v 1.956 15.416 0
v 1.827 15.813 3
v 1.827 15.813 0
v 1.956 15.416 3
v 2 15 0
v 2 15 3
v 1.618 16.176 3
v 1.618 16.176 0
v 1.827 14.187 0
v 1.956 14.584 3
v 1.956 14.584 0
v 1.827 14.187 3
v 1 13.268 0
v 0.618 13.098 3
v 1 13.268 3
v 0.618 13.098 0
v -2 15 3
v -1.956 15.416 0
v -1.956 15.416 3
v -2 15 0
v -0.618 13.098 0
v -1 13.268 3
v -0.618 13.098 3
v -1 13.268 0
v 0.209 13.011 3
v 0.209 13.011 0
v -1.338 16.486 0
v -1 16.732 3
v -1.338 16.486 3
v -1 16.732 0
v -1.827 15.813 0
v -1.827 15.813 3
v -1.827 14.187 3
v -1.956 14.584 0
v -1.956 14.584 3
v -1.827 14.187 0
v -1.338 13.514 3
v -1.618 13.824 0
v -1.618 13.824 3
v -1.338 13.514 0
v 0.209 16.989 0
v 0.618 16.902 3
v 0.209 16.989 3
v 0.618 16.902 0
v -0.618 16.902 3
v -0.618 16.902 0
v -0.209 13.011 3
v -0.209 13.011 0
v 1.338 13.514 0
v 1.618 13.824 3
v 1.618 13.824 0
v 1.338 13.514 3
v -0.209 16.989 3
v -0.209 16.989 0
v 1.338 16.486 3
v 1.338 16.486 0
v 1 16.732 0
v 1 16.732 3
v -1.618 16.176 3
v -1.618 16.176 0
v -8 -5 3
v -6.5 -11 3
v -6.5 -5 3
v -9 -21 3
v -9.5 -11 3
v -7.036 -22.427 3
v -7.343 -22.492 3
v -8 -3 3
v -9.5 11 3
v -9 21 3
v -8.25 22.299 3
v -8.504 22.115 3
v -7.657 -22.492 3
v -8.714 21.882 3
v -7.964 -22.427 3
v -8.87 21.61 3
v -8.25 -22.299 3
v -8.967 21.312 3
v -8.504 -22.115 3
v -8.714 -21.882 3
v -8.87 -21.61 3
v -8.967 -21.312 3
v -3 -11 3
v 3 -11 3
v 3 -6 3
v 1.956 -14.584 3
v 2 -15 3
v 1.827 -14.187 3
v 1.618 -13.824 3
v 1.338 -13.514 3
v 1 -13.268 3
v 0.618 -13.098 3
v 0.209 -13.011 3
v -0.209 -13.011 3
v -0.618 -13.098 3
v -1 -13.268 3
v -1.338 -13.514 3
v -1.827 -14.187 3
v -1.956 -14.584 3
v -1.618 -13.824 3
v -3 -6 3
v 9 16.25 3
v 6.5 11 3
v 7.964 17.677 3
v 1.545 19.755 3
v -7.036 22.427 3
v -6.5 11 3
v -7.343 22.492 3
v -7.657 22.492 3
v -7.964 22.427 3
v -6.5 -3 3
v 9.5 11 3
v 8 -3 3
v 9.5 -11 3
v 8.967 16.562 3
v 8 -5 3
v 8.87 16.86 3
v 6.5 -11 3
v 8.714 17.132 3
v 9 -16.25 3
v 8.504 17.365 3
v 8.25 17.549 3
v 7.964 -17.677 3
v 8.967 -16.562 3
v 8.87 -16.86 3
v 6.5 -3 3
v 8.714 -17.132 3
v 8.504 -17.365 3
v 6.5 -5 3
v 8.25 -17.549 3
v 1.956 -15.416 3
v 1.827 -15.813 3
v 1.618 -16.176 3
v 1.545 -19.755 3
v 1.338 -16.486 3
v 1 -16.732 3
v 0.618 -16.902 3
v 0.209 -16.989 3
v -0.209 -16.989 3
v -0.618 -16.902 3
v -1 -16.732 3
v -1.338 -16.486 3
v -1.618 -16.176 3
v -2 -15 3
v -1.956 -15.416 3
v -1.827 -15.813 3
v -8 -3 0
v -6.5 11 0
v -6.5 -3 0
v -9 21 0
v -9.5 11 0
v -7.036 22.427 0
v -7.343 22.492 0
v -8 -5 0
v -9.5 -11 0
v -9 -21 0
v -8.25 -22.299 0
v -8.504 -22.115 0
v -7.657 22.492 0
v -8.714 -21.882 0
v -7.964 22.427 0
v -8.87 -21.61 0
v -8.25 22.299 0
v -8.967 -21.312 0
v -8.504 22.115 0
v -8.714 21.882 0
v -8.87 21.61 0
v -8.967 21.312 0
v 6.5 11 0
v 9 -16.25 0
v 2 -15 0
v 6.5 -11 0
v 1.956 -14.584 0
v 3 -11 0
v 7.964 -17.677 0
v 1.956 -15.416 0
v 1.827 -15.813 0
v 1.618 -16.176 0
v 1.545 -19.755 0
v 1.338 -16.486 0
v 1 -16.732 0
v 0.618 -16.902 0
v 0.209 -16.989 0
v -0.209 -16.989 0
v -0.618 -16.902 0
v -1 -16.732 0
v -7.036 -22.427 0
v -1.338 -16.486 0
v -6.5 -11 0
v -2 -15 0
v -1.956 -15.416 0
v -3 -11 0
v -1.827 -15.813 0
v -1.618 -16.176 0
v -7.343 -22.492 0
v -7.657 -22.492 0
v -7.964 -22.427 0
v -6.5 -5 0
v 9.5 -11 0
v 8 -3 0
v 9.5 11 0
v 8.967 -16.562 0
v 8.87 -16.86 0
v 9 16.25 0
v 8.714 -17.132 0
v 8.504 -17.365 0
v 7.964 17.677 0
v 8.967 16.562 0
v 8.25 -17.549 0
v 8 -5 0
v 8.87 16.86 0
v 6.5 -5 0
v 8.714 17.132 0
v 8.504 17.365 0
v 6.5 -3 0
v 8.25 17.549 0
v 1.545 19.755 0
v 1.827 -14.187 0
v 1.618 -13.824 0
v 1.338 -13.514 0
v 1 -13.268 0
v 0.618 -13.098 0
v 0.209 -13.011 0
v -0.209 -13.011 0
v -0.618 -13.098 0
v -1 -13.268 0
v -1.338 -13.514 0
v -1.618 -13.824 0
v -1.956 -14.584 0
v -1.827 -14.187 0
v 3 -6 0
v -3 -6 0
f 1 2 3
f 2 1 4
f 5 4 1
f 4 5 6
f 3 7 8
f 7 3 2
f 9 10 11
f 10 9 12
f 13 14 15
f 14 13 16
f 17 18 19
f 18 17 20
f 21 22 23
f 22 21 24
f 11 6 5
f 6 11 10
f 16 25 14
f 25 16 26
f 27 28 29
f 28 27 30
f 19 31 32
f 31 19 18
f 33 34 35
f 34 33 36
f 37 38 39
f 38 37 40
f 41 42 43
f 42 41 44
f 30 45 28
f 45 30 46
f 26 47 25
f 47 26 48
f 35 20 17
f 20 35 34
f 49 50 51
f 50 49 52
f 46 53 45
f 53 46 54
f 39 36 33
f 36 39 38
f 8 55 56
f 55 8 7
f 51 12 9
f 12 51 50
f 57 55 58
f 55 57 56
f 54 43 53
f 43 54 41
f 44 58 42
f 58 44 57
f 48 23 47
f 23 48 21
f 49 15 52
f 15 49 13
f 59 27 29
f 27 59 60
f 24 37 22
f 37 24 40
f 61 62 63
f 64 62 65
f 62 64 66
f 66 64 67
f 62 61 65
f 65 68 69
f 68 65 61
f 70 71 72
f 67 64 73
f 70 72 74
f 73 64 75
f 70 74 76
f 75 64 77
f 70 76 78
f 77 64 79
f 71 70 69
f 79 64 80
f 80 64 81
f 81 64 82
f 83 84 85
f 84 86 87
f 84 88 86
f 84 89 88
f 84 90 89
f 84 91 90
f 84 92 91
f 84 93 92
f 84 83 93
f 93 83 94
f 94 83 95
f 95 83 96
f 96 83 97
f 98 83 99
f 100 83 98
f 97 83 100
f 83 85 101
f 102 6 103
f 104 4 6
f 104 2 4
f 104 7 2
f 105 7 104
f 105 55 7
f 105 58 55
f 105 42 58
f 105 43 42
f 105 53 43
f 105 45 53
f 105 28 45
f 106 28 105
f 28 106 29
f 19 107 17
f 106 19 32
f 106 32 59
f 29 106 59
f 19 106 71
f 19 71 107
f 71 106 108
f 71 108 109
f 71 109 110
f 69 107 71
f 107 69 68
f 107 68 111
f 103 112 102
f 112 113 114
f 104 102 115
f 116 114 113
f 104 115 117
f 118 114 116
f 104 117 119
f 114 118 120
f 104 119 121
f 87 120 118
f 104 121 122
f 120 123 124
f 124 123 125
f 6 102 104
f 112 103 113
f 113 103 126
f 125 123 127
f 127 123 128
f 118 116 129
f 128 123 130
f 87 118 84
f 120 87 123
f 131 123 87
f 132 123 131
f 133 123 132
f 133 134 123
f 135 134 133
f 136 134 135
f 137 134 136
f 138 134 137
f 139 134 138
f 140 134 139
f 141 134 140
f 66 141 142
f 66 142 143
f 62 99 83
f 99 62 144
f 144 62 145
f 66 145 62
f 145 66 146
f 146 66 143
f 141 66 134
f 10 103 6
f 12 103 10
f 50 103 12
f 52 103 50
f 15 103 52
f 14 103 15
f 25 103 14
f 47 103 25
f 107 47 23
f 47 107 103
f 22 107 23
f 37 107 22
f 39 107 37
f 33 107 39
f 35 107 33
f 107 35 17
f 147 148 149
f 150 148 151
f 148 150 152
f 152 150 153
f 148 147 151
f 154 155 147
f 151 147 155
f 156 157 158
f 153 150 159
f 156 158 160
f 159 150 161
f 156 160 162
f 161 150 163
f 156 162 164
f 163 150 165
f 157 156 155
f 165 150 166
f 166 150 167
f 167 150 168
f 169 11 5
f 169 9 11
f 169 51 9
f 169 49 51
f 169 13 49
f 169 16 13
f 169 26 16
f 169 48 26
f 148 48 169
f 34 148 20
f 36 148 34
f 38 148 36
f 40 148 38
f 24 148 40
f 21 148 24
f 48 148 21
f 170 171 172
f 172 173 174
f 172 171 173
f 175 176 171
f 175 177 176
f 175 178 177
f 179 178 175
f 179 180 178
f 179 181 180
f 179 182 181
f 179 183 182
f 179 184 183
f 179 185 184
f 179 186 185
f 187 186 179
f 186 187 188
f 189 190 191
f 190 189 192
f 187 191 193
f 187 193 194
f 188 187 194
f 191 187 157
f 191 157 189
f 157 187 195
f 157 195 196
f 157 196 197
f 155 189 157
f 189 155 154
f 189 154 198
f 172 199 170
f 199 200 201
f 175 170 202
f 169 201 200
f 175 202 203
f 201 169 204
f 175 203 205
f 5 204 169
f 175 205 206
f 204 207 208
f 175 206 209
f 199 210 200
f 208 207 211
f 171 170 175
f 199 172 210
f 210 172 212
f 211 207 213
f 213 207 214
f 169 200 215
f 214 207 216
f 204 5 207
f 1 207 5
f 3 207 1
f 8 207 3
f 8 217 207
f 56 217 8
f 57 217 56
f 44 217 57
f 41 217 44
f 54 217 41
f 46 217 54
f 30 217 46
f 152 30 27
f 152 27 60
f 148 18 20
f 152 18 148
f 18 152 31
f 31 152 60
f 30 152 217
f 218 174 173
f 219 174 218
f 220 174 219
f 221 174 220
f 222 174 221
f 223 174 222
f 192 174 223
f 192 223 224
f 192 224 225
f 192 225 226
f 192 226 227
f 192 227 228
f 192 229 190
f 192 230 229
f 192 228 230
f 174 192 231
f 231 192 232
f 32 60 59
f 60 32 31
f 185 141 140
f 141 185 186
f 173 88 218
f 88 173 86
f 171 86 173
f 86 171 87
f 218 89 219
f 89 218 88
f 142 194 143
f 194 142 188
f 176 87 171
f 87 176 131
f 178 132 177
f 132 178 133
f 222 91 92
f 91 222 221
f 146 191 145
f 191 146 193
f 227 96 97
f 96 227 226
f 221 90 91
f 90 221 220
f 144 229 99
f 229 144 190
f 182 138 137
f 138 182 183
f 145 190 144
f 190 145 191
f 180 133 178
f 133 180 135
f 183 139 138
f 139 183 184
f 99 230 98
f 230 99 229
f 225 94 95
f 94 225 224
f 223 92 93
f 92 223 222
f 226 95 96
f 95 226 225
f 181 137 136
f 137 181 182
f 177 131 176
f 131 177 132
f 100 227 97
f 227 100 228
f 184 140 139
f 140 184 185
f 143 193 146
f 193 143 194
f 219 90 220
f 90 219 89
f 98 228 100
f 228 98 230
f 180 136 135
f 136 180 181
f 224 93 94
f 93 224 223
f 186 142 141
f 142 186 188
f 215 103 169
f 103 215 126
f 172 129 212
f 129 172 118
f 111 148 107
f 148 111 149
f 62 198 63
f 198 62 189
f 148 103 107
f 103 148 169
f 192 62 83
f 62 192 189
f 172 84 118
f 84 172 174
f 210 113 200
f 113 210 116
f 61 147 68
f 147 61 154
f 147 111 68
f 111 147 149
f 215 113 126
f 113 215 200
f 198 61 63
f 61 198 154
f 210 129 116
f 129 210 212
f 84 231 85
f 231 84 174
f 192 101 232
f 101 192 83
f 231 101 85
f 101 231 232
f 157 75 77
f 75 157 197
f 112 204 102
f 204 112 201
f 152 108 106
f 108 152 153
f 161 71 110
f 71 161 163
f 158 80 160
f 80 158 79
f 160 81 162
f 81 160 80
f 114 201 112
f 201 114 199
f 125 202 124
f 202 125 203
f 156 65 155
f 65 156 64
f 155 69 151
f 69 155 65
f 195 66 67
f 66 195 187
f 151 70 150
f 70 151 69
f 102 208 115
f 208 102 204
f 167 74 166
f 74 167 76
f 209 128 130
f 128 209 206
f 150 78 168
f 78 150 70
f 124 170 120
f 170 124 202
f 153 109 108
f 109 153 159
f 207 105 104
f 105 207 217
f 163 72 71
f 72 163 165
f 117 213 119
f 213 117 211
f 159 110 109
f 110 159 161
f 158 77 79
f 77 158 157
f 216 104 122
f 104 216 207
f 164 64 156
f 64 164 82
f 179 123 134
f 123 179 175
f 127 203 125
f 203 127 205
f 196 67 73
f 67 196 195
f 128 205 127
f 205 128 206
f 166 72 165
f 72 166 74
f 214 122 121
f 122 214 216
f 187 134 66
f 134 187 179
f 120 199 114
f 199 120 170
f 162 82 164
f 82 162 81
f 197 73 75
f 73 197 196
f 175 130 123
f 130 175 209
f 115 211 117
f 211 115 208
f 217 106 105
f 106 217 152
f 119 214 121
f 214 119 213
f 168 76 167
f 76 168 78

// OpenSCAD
BASE_WIDTH = 19;
BASE_LENGTH = 22;
BASE_MOUNT_DIA = 10;
THICKNESS = 3;

MOUNT_HOLE_DIA = 4;
MOUNT_HOLE_SPACING = 30;

MID_HOLE_WIDTH = 13;
MID_HOLE_LENGTH = 22;
MID_HOLE_TAB_WIDTH = 6;
MID_HOLE_TAB_LENGTH = 5;
MID_HOLE_NUB_WIDTH = 1.5;
MID_HOLE_NUB_LENGTH = 2;
MID_HOLE_NUB_OFFSET = MID_HOLE_LENGTH/2-7;

CORNER_DIA = 3;
CORNER_SPACING_BOTTOM = 35.5 - CORNER_DIA;
CORNER_SPACING_TOP = 45 - CORNER_DIA;
CORNER_SPACING_X = 18 - CORNER_DIA;

BOUND_WIDTH = max(CORNER_SPACING_X, BASE_WIDTH);
BOUND_LENGTH = max(CORNER_SPACING_BOTTOM, CORNER_SPACING_TOP);

$fn = 30;

module base() {
  hull() {
    translate([-BASE_WIDTH/2, -BASE_LENGTH/2, 0])
    cube(size = [BASE_WIDTH, BASE_LENGTH, THICKNESS]);

    for(i = [1, -1]) {
      translate([0, i * MOUNT_HOLE_SPACING/2, 0])
      cylinder(d = BASE_MOUNT_DIA, h = THICKNESS);
    }
  }
}

module mount_holes() {
  for(i = [1, -1]) {
    translate([0, i * MOUNT_HOLE_SPACING/2, 0])
    cylinder(d = MOUNT_HOLE_DIA, h = THICKNESS);
  }
}

module mid_hole() {
  difference() {
    union() {
      translate([-MID_HOLE_WIDTH/2, -MID_HOLE_LENGTH/2, 0])
      cube(size = [MID_HOLE_WIDTH, MID_HOLE_LENGTH, THICKNESS]);

      w = MID_HOLE_WIDTH + 2 * MID_HOLE_NUB_WIDTH;
      l = MID_HOLE_NUB_LENGTH;
      translate([-w/2, -l/2 - MID_HOLE_NUB_OFFSET, 0])
      cube(size = [w, l, THICKNESS]);
    }

    translate([-MID_HOLE_TAB_WIDTH/2, -MID_HOLE_LENGTH/2, 0])
    cube(size = [MID_HOLE_TAB_WIDTH, MID_HOLE_TAB_LENGTH, THICKNESS]);
  }
}

module corners() {
  for(i = [1, -1]) {
    translate([CORNER_SPACING_X/2, i * CORNER_SPACING_BOTTOM/2, 0])
    cylinder(d = CORNER_DIA, h = THICKNESS);

    translate([-CORNER_SPACING_X/2, i * CORNER_SPACING_TOP/2, 0])
    cylinder(d = CORNER_DIA, h = THICKNESS);
  }
}

module gasket() {
  difference() {
    hull() {
      base();
      corners();
    }
    #mount_holes();
    #mid_hole();
  }
}

// Right
intersection() {
  gasket();
  translate([-BOUND_WIDTH/2, 0, 0])
  cube(size = [BOUND_WIDTH, BOUND_LENGTH, THICKNESS]);
}
// Left
intersection() {
  gasket();
  translate([-BOUND_WIDTH/2, -BOUND_LENGTH, 0])
  cube(size = [BOUND_WIDTH, BOUND_LENGTH, THICKNESS]);
}
